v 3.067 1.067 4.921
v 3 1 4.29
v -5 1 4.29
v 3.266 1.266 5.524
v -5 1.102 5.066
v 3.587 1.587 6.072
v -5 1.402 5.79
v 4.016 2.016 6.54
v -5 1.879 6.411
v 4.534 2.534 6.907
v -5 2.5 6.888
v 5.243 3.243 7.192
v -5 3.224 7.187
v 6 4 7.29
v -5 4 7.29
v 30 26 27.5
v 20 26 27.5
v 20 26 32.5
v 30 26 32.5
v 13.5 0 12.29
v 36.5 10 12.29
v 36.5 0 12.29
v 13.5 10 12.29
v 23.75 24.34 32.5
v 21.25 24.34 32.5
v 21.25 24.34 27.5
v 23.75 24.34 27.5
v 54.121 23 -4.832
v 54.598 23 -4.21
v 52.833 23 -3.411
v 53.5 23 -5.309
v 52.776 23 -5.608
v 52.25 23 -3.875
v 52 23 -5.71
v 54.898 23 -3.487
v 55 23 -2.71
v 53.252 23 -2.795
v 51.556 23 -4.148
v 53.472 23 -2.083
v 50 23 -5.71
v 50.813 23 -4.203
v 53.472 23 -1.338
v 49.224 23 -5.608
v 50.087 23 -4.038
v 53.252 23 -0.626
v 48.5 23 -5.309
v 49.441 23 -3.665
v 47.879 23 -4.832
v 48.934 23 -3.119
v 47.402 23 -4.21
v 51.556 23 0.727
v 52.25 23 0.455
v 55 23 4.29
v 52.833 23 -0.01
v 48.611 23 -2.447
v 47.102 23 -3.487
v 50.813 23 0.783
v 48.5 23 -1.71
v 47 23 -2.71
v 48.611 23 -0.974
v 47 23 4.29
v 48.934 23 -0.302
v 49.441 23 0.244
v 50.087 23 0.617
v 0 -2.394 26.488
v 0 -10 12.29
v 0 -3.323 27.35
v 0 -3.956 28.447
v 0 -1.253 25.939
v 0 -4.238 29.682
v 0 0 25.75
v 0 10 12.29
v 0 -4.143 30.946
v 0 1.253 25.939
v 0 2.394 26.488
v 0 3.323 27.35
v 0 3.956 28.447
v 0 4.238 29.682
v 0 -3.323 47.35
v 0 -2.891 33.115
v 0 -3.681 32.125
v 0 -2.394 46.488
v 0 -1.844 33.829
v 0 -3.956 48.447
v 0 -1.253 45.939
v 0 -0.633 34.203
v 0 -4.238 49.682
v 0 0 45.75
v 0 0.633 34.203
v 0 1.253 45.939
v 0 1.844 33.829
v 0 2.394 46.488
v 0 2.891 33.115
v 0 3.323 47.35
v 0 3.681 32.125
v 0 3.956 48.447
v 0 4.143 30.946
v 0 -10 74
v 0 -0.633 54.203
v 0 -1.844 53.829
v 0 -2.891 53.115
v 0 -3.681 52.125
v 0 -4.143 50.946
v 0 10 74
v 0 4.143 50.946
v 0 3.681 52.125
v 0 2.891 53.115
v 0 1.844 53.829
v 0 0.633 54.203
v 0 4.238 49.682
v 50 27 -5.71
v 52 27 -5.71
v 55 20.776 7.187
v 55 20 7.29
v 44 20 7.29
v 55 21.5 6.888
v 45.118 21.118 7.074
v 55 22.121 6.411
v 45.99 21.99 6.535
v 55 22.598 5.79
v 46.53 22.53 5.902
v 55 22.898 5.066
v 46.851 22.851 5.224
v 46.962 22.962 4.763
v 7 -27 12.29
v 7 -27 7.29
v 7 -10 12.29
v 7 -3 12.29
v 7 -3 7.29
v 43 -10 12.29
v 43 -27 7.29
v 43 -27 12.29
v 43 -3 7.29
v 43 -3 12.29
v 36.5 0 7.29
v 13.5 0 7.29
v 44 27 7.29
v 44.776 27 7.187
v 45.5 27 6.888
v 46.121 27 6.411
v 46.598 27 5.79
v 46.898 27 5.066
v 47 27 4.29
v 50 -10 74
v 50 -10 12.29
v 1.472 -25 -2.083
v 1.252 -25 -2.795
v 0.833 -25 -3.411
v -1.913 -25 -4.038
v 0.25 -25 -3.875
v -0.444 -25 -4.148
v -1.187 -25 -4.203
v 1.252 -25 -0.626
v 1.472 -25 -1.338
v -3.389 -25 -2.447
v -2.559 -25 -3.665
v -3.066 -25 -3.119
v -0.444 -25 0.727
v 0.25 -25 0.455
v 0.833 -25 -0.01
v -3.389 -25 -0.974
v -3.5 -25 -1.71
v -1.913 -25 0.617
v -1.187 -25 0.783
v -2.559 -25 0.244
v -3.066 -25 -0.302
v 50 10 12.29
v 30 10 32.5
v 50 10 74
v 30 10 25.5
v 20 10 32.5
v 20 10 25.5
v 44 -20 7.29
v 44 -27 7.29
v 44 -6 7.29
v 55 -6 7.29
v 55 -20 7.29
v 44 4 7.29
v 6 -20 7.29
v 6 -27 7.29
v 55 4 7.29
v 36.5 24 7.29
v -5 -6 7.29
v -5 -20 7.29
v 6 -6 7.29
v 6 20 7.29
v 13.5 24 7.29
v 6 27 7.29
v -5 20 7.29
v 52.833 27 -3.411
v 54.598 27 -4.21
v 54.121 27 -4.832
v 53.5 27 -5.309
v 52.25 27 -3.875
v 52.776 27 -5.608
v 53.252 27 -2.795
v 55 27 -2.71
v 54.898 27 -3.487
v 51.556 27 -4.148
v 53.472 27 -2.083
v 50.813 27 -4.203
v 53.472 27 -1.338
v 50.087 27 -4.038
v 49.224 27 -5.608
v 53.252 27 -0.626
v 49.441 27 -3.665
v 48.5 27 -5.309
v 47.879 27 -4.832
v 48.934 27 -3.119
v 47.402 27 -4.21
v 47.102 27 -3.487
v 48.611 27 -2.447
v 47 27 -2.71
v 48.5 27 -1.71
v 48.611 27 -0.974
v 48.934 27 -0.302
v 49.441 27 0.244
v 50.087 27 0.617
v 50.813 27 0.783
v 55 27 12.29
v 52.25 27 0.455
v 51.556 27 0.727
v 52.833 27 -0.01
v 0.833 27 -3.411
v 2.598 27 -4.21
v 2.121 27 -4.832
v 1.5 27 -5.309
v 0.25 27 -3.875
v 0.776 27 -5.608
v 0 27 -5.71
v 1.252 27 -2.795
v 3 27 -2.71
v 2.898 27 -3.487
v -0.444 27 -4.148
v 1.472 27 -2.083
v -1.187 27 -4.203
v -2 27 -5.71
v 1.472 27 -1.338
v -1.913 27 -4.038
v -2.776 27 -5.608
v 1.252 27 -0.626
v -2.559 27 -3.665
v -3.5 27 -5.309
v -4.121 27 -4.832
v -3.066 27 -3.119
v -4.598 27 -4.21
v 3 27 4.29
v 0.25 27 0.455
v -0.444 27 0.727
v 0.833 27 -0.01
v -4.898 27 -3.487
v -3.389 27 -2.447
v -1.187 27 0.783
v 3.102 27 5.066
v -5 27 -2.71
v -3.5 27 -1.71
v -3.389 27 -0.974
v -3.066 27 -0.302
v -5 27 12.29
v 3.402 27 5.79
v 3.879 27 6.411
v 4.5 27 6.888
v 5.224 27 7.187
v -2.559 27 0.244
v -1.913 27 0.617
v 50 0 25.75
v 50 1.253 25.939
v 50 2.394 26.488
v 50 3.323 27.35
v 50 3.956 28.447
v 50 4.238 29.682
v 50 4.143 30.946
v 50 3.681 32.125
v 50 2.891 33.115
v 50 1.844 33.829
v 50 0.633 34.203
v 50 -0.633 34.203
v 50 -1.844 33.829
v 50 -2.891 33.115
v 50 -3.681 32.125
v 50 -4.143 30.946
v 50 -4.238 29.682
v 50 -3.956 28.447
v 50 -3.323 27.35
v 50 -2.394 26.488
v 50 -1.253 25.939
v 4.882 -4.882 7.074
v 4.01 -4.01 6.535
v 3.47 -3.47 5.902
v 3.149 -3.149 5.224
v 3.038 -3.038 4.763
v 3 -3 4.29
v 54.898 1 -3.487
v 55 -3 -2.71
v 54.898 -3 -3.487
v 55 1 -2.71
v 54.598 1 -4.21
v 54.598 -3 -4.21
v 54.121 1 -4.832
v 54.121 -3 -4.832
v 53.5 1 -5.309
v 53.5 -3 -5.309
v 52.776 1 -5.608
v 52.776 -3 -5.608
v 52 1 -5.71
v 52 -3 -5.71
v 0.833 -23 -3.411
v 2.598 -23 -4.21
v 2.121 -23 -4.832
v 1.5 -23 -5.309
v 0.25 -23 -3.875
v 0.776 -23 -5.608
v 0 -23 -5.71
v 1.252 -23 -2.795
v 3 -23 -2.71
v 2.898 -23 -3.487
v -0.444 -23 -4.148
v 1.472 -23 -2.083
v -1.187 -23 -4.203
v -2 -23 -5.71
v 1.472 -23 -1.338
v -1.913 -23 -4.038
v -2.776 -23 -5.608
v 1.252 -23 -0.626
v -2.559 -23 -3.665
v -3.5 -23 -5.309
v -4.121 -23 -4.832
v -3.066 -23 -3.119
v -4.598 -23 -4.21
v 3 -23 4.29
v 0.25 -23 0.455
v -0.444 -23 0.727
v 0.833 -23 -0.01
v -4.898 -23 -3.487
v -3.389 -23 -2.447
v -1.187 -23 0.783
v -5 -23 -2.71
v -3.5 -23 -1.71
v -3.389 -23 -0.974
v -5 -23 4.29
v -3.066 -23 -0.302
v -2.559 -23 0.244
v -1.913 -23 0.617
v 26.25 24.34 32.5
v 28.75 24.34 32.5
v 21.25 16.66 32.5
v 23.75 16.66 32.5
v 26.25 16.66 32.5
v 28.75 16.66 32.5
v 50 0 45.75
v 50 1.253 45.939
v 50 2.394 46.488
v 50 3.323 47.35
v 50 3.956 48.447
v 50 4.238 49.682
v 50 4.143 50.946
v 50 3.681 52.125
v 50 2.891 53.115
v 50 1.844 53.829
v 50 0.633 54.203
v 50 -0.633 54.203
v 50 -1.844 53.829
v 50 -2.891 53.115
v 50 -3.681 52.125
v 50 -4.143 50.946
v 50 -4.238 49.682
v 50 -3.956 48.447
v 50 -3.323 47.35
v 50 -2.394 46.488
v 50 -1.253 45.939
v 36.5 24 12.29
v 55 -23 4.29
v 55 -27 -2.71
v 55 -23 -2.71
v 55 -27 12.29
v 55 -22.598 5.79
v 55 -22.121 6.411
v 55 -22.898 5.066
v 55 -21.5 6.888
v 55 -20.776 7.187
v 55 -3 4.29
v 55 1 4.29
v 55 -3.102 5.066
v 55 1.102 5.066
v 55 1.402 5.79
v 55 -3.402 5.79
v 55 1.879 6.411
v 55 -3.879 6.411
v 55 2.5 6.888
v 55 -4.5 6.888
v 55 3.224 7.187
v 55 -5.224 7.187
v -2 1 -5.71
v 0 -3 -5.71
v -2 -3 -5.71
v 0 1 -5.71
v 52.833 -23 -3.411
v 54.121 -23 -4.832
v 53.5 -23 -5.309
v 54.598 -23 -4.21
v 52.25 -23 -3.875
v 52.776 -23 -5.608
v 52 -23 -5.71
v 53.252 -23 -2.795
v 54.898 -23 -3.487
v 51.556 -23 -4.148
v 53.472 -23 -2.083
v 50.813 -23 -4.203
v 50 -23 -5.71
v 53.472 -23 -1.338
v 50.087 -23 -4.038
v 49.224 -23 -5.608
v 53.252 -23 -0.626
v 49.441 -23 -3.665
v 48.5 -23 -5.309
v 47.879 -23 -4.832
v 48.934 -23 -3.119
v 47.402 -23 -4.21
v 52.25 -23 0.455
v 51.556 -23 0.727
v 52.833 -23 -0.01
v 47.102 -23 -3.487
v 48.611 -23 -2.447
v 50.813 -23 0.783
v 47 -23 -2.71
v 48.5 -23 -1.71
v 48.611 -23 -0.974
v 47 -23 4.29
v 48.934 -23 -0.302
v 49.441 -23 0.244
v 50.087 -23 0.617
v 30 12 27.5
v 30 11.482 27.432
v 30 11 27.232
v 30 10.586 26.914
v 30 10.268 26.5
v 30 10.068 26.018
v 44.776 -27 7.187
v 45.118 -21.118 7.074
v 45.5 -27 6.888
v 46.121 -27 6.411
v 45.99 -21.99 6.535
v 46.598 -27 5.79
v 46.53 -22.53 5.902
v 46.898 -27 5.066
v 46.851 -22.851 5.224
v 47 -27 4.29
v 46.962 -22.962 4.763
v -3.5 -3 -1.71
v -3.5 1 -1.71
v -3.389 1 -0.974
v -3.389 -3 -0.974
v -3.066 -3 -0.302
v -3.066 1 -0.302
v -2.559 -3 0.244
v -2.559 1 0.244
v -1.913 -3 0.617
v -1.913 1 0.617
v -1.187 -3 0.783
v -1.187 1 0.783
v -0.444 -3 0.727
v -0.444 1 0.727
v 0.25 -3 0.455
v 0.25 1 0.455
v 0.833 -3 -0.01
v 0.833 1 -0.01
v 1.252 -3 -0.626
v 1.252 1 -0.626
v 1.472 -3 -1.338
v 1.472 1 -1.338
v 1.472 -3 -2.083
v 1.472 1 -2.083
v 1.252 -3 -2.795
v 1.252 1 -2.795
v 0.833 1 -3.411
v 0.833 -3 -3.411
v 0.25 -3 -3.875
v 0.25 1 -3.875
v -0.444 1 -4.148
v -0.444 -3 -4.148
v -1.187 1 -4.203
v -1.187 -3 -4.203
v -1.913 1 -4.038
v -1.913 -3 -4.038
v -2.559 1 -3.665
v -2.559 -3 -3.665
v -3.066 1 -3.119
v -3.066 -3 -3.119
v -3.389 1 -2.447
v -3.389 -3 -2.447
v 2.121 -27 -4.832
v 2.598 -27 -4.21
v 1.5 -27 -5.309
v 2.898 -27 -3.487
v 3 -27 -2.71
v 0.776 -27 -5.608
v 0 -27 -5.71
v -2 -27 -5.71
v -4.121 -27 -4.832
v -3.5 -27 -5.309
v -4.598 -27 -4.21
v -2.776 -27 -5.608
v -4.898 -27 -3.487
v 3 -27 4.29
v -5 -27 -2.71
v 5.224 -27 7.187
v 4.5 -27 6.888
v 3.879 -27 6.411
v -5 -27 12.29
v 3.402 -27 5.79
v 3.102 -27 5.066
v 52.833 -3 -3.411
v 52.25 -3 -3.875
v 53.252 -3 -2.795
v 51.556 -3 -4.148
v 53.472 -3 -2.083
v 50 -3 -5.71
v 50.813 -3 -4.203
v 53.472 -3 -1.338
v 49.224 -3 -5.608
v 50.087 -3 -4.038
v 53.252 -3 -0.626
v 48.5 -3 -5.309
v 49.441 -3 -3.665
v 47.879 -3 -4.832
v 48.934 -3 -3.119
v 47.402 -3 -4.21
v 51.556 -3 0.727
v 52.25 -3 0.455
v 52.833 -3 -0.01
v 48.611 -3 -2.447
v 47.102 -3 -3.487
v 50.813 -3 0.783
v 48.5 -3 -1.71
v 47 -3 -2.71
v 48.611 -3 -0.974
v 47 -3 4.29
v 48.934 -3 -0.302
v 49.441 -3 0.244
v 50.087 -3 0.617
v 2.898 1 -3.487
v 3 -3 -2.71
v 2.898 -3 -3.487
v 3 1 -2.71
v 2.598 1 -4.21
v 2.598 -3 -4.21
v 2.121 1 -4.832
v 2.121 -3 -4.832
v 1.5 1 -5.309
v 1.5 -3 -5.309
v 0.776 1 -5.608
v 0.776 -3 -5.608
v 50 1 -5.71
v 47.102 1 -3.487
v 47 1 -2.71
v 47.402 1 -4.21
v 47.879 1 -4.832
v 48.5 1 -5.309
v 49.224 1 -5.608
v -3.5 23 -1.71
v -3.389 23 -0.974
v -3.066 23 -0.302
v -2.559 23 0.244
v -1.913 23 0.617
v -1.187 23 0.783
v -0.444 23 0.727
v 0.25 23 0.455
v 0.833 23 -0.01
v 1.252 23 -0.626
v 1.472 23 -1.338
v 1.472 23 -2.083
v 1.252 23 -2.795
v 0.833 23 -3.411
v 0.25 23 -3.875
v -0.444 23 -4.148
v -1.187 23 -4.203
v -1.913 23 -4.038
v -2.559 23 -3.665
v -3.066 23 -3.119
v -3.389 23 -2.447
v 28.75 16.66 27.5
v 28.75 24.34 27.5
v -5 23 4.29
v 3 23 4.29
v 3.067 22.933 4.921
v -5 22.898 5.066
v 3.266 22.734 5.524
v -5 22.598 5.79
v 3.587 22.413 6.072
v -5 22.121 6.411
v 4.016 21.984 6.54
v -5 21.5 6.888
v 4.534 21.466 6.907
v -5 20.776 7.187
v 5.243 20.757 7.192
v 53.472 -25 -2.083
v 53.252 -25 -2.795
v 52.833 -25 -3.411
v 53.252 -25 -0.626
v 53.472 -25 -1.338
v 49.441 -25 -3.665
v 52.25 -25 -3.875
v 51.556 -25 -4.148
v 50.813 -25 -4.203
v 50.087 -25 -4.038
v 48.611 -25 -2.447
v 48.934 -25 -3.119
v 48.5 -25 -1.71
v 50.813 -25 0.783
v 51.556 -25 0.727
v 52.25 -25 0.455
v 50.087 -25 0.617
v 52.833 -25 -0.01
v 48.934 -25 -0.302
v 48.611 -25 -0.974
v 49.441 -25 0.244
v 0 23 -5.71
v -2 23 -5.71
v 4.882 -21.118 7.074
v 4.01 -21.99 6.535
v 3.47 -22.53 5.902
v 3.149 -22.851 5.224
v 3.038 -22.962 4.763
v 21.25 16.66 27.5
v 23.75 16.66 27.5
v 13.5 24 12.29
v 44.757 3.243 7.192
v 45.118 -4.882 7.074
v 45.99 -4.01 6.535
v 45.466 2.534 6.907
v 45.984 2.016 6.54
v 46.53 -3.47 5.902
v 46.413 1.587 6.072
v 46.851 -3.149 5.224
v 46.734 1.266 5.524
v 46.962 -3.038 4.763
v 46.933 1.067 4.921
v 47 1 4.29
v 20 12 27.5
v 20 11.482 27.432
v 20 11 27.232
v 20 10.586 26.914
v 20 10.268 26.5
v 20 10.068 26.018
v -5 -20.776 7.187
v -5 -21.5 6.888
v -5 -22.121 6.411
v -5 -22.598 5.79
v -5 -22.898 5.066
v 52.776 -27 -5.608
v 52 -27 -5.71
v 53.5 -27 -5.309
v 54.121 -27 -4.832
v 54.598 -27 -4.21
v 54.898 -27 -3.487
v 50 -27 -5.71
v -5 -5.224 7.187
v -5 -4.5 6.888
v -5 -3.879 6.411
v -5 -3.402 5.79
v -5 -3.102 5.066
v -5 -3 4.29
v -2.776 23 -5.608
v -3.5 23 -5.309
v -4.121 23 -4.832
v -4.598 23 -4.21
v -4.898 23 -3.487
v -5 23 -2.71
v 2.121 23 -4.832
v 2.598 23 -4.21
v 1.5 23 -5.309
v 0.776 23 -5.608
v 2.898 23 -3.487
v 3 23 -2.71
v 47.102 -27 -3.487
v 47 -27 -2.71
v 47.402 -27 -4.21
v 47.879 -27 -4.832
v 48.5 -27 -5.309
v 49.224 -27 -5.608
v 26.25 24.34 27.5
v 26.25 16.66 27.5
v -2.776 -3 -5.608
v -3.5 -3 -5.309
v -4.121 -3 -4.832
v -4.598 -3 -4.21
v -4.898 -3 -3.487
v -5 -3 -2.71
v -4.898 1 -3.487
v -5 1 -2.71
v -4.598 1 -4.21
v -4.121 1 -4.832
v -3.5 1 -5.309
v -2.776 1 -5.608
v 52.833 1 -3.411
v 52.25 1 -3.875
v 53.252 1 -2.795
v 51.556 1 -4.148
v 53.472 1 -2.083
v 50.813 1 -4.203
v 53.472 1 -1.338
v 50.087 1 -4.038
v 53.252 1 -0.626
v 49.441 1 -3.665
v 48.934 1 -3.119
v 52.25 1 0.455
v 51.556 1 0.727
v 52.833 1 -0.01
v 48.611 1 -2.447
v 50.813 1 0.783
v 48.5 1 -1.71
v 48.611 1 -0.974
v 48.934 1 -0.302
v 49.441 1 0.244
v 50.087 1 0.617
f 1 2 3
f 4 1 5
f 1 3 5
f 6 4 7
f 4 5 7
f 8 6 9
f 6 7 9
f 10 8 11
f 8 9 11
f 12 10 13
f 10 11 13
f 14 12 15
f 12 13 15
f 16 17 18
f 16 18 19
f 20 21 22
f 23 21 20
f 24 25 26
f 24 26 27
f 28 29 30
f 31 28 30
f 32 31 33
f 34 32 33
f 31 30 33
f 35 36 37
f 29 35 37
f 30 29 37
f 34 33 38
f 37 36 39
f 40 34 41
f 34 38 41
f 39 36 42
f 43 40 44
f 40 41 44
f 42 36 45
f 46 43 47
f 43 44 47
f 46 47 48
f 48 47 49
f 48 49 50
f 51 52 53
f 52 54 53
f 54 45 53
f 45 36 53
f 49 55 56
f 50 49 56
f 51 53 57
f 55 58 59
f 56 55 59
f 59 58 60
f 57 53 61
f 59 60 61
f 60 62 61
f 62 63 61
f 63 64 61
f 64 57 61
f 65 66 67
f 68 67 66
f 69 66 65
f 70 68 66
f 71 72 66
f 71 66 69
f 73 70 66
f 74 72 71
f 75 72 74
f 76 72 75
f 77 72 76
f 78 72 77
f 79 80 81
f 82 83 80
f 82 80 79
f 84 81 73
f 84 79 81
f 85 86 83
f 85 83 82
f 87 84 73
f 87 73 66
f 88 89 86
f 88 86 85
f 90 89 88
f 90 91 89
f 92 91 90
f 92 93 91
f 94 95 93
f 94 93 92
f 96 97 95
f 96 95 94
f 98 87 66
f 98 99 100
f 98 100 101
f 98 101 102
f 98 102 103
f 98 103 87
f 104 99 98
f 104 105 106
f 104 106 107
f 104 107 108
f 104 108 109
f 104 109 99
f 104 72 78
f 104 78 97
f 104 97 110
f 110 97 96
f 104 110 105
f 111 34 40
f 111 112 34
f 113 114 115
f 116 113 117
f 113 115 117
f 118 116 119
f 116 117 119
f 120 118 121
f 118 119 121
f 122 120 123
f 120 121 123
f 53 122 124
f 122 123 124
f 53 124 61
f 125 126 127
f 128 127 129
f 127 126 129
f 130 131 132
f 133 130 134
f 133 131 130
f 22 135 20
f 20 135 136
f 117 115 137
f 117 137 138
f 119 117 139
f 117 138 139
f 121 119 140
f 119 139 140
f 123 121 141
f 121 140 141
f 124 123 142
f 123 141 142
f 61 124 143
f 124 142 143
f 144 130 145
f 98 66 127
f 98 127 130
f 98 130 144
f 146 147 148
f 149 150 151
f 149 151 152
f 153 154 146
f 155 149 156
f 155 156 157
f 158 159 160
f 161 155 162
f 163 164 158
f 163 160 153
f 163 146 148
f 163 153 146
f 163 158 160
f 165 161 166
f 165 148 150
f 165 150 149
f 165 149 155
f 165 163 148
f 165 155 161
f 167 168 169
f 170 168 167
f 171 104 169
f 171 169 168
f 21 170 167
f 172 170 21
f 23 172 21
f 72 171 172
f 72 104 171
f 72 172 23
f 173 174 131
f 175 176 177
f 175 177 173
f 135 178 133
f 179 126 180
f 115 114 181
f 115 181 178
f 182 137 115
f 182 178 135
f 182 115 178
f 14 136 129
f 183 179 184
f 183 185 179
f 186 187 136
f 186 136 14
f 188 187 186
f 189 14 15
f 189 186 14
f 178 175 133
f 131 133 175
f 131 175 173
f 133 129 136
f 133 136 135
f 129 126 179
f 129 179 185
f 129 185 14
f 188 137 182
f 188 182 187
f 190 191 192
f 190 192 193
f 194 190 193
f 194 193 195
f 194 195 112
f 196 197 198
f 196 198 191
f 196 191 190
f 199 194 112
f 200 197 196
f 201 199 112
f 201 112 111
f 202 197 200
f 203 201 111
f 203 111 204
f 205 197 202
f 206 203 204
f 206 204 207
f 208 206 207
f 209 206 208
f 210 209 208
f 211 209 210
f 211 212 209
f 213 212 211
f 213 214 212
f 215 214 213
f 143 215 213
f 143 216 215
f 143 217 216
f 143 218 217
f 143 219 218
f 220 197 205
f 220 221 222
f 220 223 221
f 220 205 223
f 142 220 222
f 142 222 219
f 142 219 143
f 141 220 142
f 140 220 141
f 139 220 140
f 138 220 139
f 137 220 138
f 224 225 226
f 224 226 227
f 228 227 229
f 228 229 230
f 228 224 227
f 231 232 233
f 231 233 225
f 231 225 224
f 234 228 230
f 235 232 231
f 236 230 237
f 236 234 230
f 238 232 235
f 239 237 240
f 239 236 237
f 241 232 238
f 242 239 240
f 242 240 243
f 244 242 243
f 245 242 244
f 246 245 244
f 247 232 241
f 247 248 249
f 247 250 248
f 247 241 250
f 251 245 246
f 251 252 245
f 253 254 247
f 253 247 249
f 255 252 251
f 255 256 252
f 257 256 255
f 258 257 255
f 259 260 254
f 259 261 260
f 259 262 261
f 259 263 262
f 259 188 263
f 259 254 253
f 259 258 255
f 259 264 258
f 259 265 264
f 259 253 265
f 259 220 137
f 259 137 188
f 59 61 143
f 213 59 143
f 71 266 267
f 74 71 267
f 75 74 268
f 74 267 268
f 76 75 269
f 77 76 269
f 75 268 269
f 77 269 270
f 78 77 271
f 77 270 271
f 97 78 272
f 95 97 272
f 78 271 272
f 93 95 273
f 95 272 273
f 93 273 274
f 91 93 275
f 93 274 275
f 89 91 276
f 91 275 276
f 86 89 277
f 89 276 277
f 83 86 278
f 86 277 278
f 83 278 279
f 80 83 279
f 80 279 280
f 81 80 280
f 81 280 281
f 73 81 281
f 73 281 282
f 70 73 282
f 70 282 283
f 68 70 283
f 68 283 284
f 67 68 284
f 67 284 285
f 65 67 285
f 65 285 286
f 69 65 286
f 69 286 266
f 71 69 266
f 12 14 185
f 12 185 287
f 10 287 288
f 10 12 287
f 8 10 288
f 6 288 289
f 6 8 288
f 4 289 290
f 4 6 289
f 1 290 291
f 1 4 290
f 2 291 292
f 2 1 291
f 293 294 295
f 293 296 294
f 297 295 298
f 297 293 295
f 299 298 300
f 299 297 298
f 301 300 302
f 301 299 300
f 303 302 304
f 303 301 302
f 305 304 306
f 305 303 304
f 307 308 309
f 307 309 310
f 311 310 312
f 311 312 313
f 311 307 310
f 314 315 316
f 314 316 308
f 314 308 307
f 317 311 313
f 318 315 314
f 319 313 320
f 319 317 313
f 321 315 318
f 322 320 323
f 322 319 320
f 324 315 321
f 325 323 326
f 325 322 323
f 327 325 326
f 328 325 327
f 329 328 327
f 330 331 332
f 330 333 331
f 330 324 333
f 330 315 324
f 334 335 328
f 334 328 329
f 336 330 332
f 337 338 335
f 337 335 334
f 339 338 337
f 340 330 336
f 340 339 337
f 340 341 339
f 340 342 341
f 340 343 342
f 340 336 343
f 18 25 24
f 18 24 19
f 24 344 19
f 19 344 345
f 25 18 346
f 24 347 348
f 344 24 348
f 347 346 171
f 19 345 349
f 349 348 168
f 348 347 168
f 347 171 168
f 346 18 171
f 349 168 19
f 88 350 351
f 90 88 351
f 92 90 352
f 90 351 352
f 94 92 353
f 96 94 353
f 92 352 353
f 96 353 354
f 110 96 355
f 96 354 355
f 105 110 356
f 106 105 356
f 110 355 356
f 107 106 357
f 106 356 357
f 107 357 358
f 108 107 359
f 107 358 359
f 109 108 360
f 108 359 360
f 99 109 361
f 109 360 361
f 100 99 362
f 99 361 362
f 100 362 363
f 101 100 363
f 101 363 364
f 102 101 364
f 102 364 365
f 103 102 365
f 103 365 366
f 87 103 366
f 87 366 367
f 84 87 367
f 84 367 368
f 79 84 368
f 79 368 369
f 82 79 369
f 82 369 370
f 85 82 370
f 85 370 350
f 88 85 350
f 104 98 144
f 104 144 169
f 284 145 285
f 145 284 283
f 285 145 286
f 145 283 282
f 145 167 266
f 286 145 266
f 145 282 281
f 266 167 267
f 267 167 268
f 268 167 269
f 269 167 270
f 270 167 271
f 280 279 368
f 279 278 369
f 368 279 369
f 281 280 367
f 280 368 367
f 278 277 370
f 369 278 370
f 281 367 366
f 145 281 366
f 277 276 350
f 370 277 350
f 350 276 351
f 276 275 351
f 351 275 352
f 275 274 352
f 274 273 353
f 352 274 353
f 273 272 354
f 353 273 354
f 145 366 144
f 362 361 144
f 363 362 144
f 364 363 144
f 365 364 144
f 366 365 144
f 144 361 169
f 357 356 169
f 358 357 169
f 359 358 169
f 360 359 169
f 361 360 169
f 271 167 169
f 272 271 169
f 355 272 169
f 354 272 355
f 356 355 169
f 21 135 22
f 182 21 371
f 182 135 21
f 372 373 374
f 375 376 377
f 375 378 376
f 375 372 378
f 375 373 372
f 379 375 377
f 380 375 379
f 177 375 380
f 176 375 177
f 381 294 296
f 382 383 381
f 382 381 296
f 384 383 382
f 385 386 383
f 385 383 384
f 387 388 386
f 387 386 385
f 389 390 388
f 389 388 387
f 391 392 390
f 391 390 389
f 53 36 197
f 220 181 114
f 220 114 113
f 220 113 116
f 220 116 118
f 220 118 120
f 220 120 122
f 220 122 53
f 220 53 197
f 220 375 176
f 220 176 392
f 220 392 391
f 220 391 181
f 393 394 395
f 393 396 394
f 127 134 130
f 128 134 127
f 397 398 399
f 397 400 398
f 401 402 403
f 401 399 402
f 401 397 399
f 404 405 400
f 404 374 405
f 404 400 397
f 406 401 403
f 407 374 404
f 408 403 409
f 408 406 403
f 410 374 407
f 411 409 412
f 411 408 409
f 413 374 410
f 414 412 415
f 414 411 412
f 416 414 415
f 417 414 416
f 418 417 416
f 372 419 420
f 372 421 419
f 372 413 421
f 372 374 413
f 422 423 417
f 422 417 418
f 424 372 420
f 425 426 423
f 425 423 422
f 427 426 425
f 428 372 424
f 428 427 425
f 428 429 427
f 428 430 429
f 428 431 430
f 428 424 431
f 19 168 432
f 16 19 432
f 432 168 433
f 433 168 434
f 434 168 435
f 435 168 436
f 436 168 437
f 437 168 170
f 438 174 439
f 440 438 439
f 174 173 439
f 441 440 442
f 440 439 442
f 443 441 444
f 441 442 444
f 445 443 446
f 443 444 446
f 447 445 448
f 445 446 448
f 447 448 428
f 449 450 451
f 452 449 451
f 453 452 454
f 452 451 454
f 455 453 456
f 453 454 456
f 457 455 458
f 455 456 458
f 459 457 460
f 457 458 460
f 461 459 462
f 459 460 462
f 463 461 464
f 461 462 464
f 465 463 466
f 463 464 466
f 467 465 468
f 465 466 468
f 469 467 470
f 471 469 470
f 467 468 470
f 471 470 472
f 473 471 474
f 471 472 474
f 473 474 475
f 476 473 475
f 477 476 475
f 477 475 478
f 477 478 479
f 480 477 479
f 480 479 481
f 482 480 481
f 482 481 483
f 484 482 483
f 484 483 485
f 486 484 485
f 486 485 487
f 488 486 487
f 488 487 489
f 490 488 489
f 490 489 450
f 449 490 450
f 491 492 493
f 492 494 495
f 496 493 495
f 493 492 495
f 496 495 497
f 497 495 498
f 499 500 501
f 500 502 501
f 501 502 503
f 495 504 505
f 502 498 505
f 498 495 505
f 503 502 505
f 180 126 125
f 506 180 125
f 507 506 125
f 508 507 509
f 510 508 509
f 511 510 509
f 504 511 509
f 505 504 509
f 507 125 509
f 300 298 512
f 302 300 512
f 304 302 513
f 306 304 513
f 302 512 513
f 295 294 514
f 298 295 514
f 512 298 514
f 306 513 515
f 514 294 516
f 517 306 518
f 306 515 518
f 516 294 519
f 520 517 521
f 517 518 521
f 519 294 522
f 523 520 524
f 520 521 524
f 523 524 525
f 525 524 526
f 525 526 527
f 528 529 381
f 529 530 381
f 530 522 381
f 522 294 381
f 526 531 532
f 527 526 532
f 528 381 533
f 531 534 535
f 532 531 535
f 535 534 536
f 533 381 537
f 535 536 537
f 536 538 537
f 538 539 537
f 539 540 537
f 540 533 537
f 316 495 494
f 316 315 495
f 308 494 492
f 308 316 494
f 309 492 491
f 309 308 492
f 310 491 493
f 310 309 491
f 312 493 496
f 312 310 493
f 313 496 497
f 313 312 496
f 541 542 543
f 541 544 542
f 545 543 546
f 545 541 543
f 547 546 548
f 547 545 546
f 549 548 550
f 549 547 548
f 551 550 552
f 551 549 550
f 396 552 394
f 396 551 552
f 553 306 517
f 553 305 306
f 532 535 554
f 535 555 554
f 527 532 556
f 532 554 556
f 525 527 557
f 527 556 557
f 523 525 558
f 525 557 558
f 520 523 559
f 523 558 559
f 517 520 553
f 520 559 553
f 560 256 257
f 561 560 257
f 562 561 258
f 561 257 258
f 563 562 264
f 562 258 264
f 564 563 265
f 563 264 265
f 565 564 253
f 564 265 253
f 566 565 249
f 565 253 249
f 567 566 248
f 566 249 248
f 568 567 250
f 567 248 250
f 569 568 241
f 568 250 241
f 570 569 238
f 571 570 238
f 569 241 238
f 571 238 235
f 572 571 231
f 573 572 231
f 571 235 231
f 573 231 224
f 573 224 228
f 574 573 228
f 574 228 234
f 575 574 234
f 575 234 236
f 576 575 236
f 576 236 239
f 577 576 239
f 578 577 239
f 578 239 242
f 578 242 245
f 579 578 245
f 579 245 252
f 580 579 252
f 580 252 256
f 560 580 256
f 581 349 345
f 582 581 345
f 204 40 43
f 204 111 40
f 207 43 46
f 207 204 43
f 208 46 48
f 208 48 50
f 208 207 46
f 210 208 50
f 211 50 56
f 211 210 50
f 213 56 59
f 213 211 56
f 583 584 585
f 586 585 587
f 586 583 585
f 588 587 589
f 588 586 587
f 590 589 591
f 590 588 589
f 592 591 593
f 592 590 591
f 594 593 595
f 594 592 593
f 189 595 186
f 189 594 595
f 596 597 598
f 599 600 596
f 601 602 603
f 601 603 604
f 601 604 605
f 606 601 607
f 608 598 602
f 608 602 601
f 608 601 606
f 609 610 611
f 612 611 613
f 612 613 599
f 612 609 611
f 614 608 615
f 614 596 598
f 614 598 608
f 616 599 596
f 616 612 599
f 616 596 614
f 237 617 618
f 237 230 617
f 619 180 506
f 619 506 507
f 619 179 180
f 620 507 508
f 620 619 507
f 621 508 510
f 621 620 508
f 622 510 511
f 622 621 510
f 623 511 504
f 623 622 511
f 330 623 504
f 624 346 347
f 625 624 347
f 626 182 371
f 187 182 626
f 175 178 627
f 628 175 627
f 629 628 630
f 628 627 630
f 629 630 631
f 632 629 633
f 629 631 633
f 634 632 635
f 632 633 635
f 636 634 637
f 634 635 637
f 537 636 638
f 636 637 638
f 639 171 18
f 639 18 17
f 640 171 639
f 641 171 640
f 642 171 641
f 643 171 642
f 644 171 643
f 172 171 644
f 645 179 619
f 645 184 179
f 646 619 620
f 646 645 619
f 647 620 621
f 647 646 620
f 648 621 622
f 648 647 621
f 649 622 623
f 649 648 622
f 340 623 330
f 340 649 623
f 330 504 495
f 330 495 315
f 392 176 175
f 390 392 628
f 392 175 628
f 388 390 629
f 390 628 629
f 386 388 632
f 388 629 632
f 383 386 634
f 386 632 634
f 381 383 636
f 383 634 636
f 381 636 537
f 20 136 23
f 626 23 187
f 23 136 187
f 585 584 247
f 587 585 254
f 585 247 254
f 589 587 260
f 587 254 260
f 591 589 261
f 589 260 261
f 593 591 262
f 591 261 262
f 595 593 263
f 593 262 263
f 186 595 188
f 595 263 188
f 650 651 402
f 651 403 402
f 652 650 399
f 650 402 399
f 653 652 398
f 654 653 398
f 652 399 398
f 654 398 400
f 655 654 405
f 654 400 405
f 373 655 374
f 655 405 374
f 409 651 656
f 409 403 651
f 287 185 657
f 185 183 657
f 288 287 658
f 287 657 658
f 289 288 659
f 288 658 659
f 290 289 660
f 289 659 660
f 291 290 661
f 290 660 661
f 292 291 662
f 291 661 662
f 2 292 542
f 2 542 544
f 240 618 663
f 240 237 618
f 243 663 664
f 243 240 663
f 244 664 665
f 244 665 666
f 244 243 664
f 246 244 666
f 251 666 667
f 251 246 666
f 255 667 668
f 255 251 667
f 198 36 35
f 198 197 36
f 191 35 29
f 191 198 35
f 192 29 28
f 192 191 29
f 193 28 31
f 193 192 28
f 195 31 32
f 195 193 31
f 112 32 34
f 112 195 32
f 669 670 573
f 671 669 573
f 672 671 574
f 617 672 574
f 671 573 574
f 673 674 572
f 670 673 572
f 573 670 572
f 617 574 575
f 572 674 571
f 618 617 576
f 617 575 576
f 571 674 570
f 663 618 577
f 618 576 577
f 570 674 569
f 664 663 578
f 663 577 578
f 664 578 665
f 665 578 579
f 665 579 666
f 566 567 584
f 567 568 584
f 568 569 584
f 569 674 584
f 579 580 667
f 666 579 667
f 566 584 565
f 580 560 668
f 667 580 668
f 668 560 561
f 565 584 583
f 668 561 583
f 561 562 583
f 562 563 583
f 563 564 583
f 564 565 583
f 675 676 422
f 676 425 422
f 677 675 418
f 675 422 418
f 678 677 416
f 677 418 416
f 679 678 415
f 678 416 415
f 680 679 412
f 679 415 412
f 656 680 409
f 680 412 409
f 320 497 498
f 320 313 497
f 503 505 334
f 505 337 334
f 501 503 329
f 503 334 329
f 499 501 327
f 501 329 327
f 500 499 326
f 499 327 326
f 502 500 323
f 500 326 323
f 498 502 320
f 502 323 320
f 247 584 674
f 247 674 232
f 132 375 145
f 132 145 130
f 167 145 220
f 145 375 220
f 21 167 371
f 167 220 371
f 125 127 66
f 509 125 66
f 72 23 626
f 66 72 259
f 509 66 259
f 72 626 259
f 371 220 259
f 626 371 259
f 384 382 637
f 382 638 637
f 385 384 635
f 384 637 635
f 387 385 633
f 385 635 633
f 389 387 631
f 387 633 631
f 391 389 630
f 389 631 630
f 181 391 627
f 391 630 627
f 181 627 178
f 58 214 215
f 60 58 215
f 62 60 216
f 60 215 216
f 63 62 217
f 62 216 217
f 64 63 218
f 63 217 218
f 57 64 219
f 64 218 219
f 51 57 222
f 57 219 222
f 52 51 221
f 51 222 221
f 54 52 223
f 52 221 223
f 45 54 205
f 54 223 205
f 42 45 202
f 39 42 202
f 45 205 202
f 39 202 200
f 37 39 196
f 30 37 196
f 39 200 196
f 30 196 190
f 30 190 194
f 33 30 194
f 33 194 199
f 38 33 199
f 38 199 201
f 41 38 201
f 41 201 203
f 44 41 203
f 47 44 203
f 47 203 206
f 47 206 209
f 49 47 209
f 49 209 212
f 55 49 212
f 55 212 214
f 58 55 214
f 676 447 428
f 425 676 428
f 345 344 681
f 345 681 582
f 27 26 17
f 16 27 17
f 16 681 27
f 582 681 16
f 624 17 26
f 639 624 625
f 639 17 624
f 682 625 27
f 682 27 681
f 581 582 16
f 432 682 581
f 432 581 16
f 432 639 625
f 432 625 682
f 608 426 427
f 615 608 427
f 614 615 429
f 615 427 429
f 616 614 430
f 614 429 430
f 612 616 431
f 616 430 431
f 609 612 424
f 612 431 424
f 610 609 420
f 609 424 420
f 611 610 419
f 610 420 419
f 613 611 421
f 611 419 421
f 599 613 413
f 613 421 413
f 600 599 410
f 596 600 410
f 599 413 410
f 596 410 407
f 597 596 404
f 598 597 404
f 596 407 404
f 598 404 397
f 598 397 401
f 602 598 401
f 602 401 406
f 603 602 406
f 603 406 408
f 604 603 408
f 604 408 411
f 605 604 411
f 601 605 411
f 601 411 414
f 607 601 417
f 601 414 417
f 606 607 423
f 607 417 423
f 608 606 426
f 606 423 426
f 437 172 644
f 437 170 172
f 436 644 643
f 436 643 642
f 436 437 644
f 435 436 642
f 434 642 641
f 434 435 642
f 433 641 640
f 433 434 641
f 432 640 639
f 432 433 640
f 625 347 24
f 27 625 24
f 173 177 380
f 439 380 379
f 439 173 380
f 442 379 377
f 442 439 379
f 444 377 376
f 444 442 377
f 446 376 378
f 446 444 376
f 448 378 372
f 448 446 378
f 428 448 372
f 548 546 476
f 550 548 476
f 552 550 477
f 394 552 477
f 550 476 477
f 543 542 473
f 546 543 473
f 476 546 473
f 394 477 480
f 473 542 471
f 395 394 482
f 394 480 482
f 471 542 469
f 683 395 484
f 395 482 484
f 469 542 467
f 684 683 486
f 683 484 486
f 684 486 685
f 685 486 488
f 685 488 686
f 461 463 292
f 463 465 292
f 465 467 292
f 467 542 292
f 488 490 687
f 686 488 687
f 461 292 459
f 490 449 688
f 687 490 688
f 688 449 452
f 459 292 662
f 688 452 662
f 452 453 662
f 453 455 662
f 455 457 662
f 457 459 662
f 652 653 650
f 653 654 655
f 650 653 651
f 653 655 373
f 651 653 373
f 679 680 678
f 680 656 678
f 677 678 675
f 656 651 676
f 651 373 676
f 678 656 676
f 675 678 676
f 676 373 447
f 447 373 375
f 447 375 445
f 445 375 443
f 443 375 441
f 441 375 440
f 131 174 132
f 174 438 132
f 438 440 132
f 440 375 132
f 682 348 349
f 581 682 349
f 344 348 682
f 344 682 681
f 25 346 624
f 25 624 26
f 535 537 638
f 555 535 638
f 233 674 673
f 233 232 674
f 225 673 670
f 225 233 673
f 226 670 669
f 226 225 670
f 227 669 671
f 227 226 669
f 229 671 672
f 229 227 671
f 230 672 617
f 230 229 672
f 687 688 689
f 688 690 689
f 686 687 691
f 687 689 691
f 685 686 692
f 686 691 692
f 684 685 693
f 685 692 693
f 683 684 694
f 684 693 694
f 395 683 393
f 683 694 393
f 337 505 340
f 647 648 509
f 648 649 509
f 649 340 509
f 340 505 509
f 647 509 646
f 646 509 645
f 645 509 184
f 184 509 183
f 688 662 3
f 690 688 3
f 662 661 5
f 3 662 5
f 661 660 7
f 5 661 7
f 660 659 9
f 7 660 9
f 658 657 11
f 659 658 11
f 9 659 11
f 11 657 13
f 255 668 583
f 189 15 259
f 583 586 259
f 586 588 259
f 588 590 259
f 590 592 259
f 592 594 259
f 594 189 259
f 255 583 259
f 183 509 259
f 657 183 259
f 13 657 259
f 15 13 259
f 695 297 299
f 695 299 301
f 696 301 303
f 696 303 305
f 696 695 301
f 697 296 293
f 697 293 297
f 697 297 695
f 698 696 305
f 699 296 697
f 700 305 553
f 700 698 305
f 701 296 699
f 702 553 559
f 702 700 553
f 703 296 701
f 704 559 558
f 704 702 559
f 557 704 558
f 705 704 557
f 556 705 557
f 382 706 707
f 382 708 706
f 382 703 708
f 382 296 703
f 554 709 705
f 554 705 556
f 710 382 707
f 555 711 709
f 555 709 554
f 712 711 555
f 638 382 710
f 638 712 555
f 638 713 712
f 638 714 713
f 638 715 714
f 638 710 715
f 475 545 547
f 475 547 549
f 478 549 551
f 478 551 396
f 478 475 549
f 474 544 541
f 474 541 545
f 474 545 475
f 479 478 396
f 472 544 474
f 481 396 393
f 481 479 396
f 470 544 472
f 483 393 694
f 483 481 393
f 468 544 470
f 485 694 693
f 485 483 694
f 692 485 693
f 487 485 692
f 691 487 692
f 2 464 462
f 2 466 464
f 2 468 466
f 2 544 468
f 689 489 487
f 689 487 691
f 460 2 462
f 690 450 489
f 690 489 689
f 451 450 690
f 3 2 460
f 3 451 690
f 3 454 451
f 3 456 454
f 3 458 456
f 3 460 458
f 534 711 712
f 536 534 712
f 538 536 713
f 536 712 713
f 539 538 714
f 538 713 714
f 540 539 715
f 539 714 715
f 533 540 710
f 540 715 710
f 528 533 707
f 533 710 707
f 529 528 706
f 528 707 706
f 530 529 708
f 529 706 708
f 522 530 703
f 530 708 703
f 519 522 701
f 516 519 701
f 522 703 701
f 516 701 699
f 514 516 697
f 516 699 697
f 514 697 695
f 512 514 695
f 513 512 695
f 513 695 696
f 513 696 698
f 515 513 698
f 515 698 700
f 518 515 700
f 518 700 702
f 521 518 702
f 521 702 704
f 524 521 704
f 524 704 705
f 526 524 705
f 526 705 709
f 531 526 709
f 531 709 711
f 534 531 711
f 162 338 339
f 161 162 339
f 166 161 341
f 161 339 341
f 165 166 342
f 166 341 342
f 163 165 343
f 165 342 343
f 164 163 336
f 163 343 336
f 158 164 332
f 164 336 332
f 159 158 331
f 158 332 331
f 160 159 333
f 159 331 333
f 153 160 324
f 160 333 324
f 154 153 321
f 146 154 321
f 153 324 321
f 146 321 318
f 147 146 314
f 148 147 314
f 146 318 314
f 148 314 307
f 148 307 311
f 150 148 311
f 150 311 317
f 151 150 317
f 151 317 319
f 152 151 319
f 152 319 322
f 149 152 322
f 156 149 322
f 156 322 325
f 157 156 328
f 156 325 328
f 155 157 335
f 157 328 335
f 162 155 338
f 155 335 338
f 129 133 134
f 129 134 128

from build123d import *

# Parameters (mm, degrees)
BOSS_EXTRUDE1_DEPTH = 50
SKETCH3_R           = 4.25
CUT_EXTRUDE2_DEPTH  = 90.866567755
SKETCH5_W           = 10
SKETCH5_H           = 5
BOSS_EXTRUDE2_DEPTH = 16
FILLET1_R           = 2
SKETCH6_W           = 2.5
SKETCH6_H           = 7.68
CUT_EXTRUDE3_DEPTH  = 16
SKETCH9_W           = 50
SKETCH9_H           = 22.289567514
CUT_EXTRUDE4_DEPTH  = 92.520489509
SKETCH10_W          = 60
SKETCH10_H          = 54
BOSS_EXTRUDE3_DEPTH = 5
SKETCH11_W          = 23
SKETCH11_H          = 24
SKETCH11_W_2        = 36
CUT_EXTRUDE5_DEPTH  = 5
SKETCH12_W          = 8
SKETCH12_H          = 4
BOSS_EXTRUDE4_DEPTH = 13
FILLET2_R           = 3
FILLET3_R           = 3
FILLET4_R           = 3
FILLET5_R           = 3
SKETCH13_R          = 2.5
CUT_EXTRUDE6_DEPTH  = 13
SKETCH14_R          = 2.5
CUT_EXTRUDE7_DEPTH  = 10
SKETCH15_R          = 2.5
CUT_EXTRUDE8_DEPTH  = 2


with BuildPart() as part:
    # Sketch2 → Boss-Extrude1 (new body)
    with BuildSketch(Plane(origin=(0, 0, 0), x_dir=(0, 0, -1), z_dir=(1, 0, 0))):
        with BuildLine():
            Line((-74, 10), (0, 10))
            ThreePointArc((0, 10), (10, 0), (0, -10))
            Line((0, -10), (-74, -10))
            Line((-74, -10), (-74, 10))
        make_face()
    extrude(amount=BOSS_EXTRUDE1_DEPTH)

    # Sketch3 → Cut-Extrude2 (cut, through all)
    with BuildSketch(Plane(origin=(50, 0, 0), x_dir=(0, 0, -1), z_dir=(1, 0, 0))):
        with Locations((-30, 0)):
            Circle(SKETCH3_R)
        with Locations((-50, 0)):
            Circle(SKETCH3_R)
    extrude(amount=-CUT_EXTRUDE2_DEPTH, mode=Mode.SUBTRACT)

    # Sketch5 → Boss-Extrude2 (add)
    with BuildSketch(Plane(origin=(0, 10, 0), x_dir=(1, 0, 0), z_dir=(0, 1, 0))):
        with Locations((25, -30)):
            Rectangle(SKETCH5_W, SKETCH5_H)
    extrude(amount=BOSS_EXTRUDE2_DEPTH)

    # Fillet1
    fillet1_edges = [part.edges().sort_by_distance(p)[0] for p in [
        (25, 10, 27.5),
    ]]
    fillet(fillet1_edges, radius=FILLET1_R)

    # Sketch6 → Cut-Extrude3 (cut)
    with BuildSketch(Plane.XY.offset(32.5)):
        with Locations((22.5, 20.5)):
            Rectangle(SKETCH6_W, SKETCH6_H)
        with Locations((27.5, 20.5)):
            Rectangle(SKETCH6_W, SKETCH6_H)
    extrude(amount=-CUT_EXTRUDE3_DEPTH, mode=Mode.SUBTRACT)

    # Sketch9 → Cut-Extrude4 (cut, through all)
    with BuildSketch(Plane(origin=(0, 10, 0), x_dir=(1, 0, 0), z_dir=(0, 1, 0))):
        with Locations((25, -1.144783757)):
            Rectangle(SKETCH9_W, SKETCH9_H)
    extrude(amount=-CUT_EXTRUDE4_DEPTH, mode=Mode.SUBTRACT)

    # Sketch10 → Boss-Extrude3 (add)
    with BuildSketch(Plane(origin=(0, 0, 12.289567514), x_dir=(-1, 0, 0), z_dir=(0, 0, -1))):
        with Locations((-25, 0)):
            Rectangle(SKETCH10_W, SKETCH10_H)
    extrude(amount=BOSS_EXTRUDE3_DEPTH)

    # Sketch11 → Cut-Extrude5 (cut)
    with BuildSketch(Plane(origin=(0, 0, 7.289567514), x_dir=(-1, 0, 0), z_dir=(0, 0, -1))):
        with Locations((-25, 12)):
            Rectangle(SKETCH11_W, SKETCH11_H)
        with Locations((-25, -15)):
            Rectangle(SKETCH11_W_2, SKETCH11_H)
    extrude(amount=-CUT_EXTRUDE5_DEPTH, mode=Mode.SUBTRACT)

    # Sketch12 → Boss-Extrude4 (add)
    with BuildSketch(Plane(origin=(0, 0, 7.289567514), x_dir=(-1, 0, 0), z_dir=(0, 0, -1))):
        with Locations((1, 25)):
            Rectangle(SKETCH12_W, SKETCH12_H)
        with Locations((-51, 25)):
            Rectangle(SKETCH12_W, SKETCH12_H)
        with Locations((1, -25)):
            Rectangle(SKETCH12_W, SKETCH12_H)
        with Locations((-51, -25)):
            Rectangle(SKETCH12_W, SKETCH12_H)
        with Locations((1, -1)):
            Rectangle(SKETCH12_W, SKETCH12_H)
        with Locations((-51, -1)):
            Rectangle(SKETCH12_W, SKETCH12_H)
    extrude(amount=BOSS_EXTRUDE4_DEPTH)

    # Fillet2
    fillet2_edges = [part.edges().sort_by_distance(p)[0] for p in [
        (55, -25, -5.710432486),
        (47, -25, -5.710432486),
        (55, -1, -5.710432486),
        (47, -1, -5.710432486),
        (3, -25, -5.710432486),
        (-5, -25, -5.710432486),
        (3, -1, -5.710432486),
        (-5, -1, -5.710432486),
        (55, 25, -5.710432486),
        (47, 25, -5.710432486),
        (3, 25, -5.710432486),
        (-5, 25, -5.710432486),
    ]]
    fillet(fillet2_edges, radius=FILLET2_R)

    # Fillet3
    fillet3_edges = [part.edges().sort_by_distance(p)[0] for p in [
        (3, 25, 7.289567514),
        (-1, 23, 7.289567514),
    ]]
    fillet(fillet3_edges, radius=FILLET3_R)

    # Fillet4
    fillet4_edges = [part.edges().sort_by_distance(p)[0] for p in [
        (3, -25, 7.289567514),
        (-1, -23, 7.289567514),
        (47, -25, 7.289567514),
        (51, -23, 7.289567514),
        (47, -1, 7.289567514),
        (51, -3, 7.289567514),
        (3, -1, 7.289567514),
        (-1, -3, 7.289567514),
        (47, 25, 7.289567514),
        (51, 23, 7.289567514),
    ]]
    fillet(fillet4_edges, radius=FILLET4_R)

    # Fillet5
    fillet5_edges = [part.edges().sort_by_distance(p)[0] for p in [
        (49.5, 1, 7.289567514),
        (0.5, 1, 7.289567514),
    ]]
    fillet(fillet5_edges, radius=FILLET5_R)

    # Sketch13 → Cut-Extrude6 (cut)
    with BuildSketch(Plane(origin=(0, 27, 0), x_dir=(1, 0, 0), z_dir=(0, 1, 0))):
        with Locations((51, 1.710432486)):
            Circle(SKETCH13_R)
        with Locations((-1, 1.710432486)):
            Circle(SKETCH13_R)
    extrude(amount=-CUT_EXTRUDE6_DEPTH, mode=Mode.SUBTRACT)

    # Sketch14 → Cut-Extrude7 (cut)
    with BuildSketch(Plane(origin=(0, 1, 0), x_dir=(1, 0, 0), z_dir=(0, 1, 0))):
        with Locations((51, 1.710432486)):
            Circle(SKETCH14_R)
        with Locations((-1, 1.710432486)):
            Circle(SKETCH14_R)
    extrude(amount=-CUT_EXTRUDE7_DEPTH, mode=Mode.SUBTRACT)

    # Sketch15 → Cut-Extrude8 (cut)
    with BuildSketch(Plane(origin=(0, -23, 0), x_dir=(1, 0, 0), z_dir=(0, 1, 0))):
        with Locations((51, 1.710432486)):
            Circle(SKETCH15_R)
        with Locations((-1, 1.710432486)):
            Circle(SKETCH15_R)
    extrude(amount=-CUT_EXTRUDE8_DEPTH, mode=Mode.SUBTRACT)


solid = part.part
